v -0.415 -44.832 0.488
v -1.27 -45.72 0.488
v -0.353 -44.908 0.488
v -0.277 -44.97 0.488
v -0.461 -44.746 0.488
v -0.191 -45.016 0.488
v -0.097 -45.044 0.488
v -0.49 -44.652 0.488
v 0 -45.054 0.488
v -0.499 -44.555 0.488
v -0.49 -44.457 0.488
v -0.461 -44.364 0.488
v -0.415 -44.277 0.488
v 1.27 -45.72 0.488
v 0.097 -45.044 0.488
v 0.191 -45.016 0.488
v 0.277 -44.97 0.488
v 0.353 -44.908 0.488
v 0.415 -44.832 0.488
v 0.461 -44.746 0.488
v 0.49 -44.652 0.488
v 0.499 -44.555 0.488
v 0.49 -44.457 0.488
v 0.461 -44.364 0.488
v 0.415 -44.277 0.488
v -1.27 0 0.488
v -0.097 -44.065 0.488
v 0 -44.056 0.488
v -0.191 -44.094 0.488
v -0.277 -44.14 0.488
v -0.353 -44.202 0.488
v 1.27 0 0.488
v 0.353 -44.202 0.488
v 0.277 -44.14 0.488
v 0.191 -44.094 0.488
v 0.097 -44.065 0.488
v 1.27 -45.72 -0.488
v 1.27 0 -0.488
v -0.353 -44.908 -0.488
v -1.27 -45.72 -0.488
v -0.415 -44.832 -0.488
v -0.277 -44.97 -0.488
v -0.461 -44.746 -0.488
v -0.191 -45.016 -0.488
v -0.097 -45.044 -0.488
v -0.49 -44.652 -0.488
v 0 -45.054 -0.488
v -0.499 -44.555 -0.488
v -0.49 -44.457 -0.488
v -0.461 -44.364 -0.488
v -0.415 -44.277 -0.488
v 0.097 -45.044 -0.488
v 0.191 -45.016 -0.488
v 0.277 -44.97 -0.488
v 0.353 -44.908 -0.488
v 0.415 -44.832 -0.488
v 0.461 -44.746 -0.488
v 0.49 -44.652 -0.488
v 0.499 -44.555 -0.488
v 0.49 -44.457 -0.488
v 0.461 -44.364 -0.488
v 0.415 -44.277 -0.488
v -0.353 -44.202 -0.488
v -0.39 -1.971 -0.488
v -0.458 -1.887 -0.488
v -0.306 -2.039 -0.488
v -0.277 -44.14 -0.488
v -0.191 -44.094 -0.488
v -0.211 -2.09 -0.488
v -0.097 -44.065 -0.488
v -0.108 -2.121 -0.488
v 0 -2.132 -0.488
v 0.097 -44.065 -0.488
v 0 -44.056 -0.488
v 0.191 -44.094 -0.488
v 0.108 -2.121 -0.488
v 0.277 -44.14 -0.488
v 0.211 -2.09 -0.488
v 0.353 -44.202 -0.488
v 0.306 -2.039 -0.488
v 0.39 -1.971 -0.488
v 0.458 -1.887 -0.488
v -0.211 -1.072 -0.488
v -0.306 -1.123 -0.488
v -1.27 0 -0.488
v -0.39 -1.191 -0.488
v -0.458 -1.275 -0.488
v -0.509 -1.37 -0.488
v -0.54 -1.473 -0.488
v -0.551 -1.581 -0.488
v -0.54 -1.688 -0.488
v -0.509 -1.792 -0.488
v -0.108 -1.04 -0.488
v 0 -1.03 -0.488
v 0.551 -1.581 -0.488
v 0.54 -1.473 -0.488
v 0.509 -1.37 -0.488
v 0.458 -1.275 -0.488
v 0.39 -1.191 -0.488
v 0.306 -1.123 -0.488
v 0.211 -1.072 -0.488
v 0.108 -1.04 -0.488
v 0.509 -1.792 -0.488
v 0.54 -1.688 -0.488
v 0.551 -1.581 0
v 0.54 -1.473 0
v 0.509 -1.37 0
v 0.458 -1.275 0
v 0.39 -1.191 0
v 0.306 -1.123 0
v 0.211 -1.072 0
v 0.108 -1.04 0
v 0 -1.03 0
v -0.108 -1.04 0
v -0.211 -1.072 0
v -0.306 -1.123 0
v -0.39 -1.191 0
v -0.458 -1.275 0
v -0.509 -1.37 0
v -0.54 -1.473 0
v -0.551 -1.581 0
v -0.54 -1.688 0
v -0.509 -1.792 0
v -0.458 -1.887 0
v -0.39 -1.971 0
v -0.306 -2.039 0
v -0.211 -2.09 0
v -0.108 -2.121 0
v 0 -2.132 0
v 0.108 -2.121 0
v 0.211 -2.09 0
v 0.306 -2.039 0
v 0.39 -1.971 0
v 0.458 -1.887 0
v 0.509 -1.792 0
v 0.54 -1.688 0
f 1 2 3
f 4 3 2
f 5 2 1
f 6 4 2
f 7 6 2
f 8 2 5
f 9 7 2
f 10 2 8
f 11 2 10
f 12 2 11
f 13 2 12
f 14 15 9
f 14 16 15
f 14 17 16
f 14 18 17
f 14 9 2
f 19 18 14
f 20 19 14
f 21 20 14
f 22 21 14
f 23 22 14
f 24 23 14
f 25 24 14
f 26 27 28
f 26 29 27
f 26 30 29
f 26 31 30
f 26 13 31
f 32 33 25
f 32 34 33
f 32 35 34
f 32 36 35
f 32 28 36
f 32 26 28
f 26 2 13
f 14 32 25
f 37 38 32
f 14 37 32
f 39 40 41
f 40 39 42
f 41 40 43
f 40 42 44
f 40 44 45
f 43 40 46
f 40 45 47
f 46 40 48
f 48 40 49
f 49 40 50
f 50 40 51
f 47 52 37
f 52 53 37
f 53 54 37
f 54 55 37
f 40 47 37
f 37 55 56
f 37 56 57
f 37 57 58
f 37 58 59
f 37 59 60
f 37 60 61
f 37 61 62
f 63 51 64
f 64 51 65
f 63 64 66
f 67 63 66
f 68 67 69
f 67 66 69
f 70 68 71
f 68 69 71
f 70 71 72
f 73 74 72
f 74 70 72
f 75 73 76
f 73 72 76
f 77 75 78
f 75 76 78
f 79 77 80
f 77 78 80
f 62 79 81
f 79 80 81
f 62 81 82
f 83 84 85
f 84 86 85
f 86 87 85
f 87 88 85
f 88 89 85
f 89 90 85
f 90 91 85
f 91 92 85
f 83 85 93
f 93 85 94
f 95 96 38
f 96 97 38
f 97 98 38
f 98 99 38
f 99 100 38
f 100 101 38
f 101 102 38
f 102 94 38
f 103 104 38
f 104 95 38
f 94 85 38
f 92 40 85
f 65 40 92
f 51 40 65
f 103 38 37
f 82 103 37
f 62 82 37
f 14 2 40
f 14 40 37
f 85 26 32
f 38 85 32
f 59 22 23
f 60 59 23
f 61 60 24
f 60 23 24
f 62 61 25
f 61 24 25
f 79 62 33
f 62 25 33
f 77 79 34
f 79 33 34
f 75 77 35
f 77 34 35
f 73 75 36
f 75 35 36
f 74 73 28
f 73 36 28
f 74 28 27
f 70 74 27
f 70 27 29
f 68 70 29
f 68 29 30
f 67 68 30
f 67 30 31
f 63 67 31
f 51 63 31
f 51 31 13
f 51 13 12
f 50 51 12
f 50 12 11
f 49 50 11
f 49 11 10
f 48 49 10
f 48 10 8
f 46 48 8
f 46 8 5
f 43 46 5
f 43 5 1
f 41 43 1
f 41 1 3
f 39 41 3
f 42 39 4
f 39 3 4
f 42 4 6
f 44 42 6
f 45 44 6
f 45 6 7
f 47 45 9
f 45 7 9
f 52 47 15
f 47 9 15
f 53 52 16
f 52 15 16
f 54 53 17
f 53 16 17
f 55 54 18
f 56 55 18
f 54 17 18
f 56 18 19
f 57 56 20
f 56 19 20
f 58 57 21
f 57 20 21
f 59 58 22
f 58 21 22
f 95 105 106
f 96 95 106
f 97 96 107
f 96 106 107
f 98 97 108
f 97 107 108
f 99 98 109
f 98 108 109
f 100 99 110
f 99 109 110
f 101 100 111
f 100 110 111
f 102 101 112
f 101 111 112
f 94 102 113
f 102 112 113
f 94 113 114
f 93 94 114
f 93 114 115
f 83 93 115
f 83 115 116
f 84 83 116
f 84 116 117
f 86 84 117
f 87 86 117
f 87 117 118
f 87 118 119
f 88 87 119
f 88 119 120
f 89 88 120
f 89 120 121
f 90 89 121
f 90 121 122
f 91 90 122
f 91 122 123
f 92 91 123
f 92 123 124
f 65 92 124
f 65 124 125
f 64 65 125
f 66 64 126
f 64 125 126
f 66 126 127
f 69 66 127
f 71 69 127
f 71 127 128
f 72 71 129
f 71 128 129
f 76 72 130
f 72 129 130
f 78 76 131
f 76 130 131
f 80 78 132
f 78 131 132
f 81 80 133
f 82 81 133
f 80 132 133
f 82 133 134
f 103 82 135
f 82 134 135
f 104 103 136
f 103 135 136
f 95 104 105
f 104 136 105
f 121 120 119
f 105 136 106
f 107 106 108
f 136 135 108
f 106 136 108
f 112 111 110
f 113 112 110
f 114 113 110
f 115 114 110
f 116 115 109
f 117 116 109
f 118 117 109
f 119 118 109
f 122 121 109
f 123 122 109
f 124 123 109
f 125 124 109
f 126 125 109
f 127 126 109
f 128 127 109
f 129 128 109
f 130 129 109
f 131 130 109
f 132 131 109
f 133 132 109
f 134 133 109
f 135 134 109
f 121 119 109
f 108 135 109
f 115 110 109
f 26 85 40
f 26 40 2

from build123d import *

# Parameters (mm, degrees)
F0_W     = 2.54
F0_H     = 0.976924
F1_DEPTH = 45.72
F2_R     = 0.499245
F3_DEPTH = 25.4
F4_R     = 0.551082
F5_DEPTH = 50.8


with BuildPart() as f1:
    # F0 (on Front) → F1 (new body)
    with BuildSketch(Plane.XZ):
        Rectangle(F0_W, F0_H)
    extrude(amount=F1_DEPTH)

    # F2 (on face) → F3 (cut)
    with BuildSketch(Plane.XY.offset(0.488462)):
        with Locations((0, -44.554785)):
            Circle(F2_R)
    extrude(amount=-F3_DEPTH, mode=Mode.SUBTRACT)

    # F4 (on Top) → F5 (cut)
    with BuildSketch(Plane.XY):
        with Locations((0, -1.580954)):
            Circle(F4_R)
    extrude(amount=-F5_DEPTH, mode=Mode.SUBTRACT)


solid = f1.part
